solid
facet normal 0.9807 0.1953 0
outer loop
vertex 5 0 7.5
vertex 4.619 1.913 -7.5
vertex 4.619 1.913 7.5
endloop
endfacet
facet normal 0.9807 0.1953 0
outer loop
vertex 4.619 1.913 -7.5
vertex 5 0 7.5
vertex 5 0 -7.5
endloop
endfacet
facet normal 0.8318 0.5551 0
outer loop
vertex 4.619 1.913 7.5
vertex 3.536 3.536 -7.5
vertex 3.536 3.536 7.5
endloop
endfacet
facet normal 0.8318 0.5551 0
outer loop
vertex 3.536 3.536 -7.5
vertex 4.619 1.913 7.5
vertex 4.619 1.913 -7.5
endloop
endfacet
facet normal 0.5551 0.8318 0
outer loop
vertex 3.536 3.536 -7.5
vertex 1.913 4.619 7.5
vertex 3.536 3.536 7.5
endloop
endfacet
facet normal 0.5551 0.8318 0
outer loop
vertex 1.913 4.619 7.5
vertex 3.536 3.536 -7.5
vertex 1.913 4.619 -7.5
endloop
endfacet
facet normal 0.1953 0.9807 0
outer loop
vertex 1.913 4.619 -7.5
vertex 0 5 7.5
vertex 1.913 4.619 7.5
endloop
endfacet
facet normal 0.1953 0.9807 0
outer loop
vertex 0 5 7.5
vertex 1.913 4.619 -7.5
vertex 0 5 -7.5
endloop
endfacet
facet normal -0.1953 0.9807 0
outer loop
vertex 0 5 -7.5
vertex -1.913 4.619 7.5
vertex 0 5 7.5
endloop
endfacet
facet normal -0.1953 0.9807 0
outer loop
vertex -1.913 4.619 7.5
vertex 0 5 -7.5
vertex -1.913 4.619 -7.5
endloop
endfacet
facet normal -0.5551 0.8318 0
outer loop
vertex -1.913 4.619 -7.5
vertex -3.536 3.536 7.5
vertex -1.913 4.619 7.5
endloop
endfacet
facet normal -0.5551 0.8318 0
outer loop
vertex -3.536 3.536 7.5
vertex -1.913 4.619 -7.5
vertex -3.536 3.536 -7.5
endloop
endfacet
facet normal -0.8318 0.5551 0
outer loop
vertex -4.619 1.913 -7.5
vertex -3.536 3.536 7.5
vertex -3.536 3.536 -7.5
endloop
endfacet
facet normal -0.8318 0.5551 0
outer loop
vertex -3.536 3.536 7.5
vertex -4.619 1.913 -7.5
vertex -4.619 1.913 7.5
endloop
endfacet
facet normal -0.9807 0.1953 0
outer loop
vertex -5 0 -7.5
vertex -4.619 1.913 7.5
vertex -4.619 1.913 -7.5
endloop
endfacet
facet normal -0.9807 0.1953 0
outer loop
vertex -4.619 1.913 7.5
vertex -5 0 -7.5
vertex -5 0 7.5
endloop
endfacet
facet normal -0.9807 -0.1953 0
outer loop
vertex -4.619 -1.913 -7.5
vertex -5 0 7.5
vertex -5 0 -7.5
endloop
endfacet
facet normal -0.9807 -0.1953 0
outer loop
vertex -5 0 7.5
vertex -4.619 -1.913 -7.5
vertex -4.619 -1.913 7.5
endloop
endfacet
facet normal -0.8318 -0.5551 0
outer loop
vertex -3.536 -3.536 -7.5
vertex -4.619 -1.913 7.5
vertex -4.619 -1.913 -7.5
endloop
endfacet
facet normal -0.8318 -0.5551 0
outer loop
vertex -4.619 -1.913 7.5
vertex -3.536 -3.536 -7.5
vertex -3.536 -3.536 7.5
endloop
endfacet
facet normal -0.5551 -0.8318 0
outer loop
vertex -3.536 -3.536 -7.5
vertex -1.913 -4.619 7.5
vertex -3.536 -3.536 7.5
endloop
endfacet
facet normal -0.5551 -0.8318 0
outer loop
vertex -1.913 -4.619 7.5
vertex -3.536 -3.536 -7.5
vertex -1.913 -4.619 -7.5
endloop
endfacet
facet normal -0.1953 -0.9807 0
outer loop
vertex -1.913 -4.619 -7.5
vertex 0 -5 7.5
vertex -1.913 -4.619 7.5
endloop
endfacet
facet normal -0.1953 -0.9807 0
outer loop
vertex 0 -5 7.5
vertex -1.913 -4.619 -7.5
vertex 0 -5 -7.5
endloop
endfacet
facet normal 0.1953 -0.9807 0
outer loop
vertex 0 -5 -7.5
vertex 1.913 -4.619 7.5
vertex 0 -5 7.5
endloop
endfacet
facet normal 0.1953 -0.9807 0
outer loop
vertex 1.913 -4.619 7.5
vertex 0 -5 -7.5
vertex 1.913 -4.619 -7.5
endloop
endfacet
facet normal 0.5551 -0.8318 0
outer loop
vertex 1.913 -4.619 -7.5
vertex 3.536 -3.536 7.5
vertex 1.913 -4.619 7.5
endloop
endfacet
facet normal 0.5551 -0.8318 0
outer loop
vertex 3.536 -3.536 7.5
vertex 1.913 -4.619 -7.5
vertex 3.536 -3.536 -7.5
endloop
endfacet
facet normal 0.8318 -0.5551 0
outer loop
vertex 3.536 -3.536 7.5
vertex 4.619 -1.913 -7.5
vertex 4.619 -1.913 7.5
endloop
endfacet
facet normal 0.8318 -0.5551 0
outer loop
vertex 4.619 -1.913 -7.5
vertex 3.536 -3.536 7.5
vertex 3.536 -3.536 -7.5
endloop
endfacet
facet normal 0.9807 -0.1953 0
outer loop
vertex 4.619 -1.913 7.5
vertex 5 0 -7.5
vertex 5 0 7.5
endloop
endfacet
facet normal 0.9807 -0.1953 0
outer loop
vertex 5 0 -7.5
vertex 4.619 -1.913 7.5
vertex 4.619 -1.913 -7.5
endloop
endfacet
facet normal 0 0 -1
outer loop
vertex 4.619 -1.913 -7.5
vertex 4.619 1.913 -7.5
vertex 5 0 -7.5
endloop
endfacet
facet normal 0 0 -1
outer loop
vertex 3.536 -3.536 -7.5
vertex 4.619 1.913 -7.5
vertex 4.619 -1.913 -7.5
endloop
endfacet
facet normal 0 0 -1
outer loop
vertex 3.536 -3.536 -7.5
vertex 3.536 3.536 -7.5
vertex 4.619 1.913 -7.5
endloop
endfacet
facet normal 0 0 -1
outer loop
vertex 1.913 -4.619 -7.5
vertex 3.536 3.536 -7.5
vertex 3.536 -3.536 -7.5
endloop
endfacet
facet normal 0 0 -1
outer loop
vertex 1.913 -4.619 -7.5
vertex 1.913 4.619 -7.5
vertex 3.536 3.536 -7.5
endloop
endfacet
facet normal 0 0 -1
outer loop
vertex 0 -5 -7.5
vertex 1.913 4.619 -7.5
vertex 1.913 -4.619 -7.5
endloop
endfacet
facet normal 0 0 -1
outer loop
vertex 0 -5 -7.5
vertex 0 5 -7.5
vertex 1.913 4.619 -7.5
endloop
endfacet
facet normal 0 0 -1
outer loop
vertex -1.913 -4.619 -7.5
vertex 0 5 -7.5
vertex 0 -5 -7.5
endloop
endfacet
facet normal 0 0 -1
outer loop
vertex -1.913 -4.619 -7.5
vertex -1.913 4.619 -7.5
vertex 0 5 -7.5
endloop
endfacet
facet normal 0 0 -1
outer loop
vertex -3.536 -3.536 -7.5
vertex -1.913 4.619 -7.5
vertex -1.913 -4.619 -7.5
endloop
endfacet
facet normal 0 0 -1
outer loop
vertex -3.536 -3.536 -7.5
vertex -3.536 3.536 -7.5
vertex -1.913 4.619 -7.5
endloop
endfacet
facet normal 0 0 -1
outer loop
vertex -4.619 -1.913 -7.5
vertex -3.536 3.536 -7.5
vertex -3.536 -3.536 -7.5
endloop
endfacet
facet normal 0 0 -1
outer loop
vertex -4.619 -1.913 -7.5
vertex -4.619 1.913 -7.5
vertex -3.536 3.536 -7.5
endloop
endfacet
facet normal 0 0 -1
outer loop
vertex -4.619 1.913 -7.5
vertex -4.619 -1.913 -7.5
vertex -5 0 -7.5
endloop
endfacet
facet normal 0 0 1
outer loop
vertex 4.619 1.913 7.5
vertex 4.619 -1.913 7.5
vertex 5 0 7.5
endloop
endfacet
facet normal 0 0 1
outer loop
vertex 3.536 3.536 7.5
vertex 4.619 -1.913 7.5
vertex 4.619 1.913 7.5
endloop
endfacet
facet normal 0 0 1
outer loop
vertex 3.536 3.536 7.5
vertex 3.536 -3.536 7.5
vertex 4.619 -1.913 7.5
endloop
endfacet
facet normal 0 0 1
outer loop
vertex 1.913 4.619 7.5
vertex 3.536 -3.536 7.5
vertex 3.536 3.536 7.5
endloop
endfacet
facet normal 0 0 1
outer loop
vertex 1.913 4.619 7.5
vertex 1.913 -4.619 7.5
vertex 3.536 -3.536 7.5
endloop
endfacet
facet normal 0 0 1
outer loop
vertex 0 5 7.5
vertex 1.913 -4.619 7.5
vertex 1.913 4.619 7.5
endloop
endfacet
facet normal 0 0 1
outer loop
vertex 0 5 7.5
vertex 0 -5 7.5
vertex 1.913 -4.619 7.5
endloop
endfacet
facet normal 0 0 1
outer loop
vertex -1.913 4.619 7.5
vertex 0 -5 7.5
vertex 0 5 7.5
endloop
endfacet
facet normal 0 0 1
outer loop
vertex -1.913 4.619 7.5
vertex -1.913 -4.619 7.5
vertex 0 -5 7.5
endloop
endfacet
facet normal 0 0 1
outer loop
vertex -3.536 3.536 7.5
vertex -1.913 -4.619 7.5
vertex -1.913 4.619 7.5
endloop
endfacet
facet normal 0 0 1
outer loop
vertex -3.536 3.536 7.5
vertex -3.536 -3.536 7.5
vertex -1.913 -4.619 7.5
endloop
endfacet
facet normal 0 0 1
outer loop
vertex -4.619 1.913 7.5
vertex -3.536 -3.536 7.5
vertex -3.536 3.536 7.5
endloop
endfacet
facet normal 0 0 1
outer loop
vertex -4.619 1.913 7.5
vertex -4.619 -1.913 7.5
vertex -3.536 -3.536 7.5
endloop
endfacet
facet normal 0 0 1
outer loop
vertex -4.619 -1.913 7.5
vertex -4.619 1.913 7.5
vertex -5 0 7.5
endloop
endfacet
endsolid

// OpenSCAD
// cylinder_param.scad
// param: r=5, h=15
module param_cyl(r=5, h=15) {
    cylinder(r=r, h=h, center=true);
}
param_cyl(r=5, h=15);
